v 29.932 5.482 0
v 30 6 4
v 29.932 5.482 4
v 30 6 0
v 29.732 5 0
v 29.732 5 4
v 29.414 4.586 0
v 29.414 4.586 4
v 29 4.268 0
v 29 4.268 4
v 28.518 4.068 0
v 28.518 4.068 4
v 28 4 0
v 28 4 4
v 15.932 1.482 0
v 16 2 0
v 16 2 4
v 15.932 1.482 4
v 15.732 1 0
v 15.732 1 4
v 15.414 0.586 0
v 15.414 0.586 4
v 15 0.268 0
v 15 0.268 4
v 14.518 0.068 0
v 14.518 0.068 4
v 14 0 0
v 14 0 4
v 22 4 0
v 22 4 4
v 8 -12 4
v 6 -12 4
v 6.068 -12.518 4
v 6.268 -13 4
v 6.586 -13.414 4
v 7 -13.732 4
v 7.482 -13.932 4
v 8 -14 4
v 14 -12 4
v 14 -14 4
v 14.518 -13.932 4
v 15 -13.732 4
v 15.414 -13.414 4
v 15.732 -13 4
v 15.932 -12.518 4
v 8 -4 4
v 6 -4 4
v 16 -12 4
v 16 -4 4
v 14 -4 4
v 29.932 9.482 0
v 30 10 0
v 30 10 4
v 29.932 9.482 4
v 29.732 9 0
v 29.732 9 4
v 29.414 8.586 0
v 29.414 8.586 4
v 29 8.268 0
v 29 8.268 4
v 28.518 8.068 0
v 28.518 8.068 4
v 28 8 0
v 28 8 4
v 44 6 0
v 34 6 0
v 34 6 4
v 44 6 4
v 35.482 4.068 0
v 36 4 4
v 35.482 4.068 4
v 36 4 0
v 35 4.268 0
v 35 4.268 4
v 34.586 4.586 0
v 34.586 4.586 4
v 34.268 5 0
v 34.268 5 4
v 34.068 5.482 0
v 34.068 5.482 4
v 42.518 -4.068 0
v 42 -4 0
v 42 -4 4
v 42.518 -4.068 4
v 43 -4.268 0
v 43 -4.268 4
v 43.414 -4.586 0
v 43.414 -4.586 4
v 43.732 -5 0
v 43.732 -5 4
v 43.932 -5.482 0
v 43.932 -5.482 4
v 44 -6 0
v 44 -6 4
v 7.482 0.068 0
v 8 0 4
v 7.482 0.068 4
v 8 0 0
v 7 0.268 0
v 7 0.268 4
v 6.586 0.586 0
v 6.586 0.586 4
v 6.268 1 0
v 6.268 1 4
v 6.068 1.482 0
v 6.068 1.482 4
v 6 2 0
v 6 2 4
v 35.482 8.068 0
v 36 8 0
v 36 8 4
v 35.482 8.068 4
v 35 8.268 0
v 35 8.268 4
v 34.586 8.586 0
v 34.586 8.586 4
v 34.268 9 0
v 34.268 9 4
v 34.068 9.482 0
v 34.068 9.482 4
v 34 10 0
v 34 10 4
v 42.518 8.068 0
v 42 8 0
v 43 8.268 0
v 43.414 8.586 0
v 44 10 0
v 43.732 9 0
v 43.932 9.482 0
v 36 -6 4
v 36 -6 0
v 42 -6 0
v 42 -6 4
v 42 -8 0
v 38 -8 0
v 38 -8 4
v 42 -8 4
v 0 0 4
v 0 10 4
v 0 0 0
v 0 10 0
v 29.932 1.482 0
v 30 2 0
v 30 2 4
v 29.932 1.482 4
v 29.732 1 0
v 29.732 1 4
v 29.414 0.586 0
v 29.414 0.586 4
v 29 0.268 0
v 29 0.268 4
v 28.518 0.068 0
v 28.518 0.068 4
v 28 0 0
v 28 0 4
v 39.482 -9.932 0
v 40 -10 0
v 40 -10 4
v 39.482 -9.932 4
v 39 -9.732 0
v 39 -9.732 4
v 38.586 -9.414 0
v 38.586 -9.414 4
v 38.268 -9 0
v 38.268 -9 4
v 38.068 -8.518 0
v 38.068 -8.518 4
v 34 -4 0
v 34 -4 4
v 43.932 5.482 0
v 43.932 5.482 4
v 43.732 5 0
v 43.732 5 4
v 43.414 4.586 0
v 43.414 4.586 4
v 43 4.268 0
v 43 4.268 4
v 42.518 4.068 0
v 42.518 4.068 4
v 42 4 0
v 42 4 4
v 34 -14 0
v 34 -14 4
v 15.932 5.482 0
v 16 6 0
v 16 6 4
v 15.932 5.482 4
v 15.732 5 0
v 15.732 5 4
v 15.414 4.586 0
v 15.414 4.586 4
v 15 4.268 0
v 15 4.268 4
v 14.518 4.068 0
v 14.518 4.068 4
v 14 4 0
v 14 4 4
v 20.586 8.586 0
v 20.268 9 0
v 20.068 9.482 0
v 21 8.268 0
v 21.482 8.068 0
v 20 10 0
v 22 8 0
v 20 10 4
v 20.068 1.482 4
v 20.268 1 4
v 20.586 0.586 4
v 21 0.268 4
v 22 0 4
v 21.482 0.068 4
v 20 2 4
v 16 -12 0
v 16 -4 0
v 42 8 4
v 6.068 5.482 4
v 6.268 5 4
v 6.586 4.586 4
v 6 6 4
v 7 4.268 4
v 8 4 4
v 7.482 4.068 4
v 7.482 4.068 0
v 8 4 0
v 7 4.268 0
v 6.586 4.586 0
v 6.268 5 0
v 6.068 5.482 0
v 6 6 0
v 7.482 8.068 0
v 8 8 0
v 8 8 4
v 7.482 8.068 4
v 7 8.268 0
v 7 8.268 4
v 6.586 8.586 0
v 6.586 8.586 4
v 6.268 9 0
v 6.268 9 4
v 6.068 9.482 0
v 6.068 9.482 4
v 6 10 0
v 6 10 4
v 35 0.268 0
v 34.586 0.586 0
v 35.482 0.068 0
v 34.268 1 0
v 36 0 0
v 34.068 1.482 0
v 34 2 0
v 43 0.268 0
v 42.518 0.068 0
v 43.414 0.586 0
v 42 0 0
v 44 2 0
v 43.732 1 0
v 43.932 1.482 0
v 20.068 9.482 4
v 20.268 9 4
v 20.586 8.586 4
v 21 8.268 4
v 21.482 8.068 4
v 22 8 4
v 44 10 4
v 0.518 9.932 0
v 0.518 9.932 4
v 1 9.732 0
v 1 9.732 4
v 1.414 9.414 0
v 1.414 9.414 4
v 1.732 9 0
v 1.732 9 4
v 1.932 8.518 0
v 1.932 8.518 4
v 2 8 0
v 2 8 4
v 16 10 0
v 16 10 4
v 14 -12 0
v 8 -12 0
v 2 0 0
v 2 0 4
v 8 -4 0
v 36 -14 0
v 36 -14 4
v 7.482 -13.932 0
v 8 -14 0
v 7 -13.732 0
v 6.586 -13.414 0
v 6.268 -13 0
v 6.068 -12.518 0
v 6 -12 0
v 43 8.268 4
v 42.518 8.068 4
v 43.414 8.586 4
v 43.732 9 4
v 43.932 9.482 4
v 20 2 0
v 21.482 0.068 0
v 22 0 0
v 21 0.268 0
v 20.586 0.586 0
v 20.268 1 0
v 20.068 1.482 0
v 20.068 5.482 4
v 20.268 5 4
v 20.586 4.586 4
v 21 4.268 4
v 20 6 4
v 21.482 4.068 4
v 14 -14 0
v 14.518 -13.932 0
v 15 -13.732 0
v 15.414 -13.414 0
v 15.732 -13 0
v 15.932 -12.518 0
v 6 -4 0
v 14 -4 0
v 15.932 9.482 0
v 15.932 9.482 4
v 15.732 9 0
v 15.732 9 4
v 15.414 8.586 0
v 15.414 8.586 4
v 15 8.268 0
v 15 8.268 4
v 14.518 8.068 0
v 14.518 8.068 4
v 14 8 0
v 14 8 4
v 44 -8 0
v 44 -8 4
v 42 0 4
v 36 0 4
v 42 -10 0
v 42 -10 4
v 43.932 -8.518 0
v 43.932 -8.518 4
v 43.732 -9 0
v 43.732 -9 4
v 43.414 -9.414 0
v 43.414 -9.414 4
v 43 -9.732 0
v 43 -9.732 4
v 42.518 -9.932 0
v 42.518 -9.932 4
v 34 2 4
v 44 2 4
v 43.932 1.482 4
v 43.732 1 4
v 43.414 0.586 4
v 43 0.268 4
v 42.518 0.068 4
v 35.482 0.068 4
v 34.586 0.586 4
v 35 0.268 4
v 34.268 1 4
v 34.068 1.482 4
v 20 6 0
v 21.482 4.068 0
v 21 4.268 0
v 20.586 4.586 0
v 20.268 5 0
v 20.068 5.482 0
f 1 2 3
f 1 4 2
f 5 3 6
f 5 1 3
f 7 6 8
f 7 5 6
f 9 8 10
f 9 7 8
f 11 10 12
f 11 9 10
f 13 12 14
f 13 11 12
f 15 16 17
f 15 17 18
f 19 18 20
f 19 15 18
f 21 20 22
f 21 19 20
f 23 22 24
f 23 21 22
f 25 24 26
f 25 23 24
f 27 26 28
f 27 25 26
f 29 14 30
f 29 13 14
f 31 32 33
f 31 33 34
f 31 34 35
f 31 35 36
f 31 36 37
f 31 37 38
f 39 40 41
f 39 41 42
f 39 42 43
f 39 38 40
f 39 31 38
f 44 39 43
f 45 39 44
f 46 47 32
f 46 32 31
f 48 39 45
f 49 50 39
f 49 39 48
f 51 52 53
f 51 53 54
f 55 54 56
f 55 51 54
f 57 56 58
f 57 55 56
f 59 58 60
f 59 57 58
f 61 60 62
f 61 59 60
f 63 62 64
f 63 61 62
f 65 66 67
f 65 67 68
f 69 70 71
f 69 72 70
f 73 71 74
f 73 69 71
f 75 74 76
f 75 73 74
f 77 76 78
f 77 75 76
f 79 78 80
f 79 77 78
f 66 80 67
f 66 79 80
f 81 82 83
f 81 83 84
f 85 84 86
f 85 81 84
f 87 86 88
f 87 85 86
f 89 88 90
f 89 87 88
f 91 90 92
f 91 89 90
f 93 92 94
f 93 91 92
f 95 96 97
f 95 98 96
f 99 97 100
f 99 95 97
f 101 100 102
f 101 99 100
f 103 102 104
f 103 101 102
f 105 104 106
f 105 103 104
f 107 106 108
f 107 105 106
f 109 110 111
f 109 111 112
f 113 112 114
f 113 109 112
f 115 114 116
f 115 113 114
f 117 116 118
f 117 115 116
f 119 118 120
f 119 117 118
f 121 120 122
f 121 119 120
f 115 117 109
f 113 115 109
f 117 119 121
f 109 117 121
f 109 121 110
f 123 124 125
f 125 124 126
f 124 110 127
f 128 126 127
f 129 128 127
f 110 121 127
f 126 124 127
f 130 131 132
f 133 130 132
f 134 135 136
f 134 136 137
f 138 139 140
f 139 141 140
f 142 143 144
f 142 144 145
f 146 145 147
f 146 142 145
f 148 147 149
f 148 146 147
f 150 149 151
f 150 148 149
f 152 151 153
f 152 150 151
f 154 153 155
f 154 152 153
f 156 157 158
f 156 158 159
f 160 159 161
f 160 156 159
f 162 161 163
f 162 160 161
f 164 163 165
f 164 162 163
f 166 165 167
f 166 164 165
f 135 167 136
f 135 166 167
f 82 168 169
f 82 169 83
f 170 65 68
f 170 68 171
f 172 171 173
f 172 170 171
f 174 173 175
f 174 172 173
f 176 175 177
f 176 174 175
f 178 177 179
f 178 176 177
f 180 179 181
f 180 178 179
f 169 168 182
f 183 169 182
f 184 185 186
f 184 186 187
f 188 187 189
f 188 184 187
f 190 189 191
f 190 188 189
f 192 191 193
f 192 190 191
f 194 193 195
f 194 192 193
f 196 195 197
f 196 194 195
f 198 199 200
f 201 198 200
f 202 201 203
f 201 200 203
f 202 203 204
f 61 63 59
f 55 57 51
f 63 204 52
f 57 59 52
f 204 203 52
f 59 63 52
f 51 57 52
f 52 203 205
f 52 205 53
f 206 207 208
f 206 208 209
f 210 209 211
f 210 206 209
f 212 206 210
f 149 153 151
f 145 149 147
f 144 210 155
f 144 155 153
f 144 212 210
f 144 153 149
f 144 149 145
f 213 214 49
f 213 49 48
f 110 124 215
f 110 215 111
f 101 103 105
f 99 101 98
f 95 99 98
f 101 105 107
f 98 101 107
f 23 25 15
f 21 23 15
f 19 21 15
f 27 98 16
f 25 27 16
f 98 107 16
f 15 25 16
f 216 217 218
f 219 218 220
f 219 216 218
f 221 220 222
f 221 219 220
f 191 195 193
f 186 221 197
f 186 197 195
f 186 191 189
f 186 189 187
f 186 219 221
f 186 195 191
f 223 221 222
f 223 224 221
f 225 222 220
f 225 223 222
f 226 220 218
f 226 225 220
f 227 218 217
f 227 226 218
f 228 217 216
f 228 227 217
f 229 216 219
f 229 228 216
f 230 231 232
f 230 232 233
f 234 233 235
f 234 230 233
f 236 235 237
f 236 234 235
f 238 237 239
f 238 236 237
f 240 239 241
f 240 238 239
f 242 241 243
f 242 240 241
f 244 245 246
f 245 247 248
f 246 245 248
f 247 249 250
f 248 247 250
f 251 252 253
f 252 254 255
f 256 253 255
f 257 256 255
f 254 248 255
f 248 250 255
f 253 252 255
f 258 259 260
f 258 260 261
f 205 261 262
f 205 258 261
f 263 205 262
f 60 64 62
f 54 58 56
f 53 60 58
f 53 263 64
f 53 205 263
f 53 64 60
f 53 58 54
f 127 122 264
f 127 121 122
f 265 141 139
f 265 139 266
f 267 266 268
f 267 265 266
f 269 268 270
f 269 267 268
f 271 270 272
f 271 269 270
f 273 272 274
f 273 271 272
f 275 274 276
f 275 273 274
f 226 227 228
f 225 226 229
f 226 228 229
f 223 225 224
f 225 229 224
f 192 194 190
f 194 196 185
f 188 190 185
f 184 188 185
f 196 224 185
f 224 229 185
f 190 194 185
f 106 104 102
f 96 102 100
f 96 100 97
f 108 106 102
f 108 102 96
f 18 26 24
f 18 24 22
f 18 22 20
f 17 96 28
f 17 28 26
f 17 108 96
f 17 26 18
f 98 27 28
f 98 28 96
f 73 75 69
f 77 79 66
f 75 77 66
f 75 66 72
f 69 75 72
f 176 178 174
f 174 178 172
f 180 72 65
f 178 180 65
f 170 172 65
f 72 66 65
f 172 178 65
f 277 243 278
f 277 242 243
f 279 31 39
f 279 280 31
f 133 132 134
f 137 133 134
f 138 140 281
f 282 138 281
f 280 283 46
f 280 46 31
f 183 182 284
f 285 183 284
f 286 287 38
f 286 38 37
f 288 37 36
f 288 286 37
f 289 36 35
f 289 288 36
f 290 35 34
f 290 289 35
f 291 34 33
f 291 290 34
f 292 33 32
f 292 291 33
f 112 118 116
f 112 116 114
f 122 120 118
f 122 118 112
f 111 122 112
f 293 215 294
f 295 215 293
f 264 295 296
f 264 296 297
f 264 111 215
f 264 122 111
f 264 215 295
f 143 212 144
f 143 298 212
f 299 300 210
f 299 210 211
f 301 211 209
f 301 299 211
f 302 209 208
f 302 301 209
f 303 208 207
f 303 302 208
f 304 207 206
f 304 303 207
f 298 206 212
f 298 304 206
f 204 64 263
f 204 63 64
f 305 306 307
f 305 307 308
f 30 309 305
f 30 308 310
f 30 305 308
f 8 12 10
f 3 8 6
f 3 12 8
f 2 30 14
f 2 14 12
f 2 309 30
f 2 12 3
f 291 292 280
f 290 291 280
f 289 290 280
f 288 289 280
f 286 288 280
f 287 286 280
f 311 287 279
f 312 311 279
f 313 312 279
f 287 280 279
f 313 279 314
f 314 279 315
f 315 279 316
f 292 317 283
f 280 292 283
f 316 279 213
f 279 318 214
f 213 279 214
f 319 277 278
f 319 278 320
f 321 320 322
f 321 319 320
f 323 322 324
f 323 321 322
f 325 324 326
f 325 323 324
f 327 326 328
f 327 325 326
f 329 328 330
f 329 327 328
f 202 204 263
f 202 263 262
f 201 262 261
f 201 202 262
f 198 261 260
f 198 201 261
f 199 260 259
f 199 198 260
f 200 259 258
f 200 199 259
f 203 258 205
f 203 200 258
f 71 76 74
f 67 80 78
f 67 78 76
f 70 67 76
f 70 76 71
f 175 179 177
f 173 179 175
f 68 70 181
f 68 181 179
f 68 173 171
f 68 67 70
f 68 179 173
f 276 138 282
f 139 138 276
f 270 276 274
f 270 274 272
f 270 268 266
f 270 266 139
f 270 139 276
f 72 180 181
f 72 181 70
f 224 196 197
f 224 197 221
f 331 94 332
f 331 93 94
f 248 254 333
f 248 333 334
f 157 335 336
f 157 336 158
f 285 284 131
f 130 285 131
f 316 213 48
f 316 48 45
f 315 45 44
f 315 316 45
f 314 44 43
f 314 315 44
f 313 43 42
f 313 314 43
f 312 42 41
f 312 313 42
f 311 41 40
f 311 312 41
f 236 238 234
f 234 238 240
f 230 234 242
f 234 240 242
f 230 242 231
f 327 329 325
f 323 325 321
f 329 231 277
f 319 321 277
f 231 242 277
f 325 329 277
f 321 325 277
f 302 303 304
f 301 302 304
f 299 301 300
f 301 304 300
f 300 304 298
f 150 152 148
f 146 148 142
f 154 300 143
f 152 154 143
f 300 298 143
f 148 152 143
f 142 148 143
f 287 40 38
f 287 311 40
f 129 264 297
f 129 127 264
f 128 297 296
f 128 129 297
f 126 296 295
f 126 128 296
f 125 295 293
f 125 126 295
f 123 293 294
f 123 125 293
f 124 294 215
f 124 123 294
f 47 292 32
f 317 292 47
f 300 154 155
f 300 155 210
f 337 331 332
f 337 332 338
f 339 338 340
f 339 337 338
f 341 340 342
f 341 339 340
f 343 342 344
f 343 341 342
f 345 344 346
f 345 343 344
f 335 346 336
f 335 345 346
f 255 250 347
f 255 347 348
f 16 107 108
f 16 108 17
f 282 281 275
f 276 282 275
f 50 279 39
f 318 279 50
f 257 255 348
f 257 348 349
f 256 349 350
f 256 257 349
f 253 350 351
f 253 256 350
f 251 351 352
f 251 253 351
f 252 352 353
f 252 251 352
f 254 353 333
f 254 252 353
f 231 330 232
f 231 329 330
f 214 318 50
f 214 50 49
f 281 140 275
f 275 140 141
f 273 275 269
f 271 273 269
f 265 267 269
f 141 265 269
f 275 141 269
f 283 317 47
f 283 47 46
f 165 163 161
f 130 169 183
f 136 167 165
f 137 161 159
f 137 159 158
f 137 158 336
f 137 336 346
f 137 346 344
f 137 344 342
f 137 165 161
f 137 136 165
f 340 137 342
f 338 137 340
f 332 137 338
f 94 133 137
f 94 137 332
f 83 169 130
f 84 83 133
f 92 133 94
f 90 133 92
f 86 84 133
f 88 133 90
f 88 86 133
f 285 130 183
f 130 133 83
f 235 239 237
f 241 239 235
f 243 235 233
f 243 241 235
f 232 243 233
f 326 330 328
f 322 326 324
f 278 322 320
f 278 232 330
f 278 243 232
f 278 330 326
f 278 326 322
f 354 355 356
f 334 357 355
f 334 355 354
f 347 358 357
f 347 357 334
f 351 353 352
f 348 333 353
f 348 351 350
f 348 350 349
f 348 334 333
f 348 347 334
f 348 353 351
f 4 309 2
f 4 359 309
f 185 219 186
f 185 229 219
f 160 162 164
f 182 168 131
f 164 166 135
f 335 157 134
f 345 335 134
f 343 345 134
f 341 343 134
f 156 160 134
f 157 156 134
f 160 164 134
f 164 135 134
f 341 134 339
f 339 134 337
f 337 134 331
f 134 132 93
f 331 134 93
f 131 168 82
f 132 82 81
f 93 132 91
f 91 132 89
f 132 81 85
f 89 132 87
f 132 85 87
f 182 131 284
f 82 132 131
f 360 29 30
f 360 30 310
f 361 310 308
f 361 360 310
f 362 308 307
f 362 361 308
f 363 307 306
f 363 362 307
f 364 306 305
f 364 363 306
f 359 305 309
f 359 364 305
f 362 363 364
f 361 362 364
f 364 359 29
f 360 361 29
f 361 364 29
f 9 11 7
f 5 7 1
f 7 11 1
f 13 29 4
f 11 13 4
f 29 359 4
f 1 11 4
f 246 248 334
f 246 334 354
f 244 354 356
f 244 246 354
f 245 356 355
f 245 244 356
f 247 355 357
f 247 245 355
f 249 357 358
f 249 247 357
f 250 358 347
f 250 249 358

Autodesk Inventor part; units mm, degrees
ref_plane "YZ Plane" through (0, 0, 0) normal (1, 0, 0) x (0, 1, 0)
ref_plane "XZ Plane" through (0, 0, 0) normal (0, 1, 0) x (-1, 0, 0)
ref_plane "XY Plane" through (0, 0, 0) normal (0, 0, 1) x (1, 0, 0)
sketch "Sketch5" plane through (0, 0, 0) normal (0, 0, 1) x (1, 0, 0)
  line L0 (0, 0) -> (2, 0)
  line L1 (2, 0) -> (2, 8)
  line L2 (0, 10) -> (0, 10)
  line L3 (0, 10) -> (0, 0)
  line L4 (6, 10) -> (16, 10)
  line L5 (16, 10) -> (16, 10)
  line L6 (14, 8) -> (8, 8)
  line L7 (6, 10) -> (6, 10)
  line L8 (6, 6) -> (16, 6)
  line L9 (16, 6) -> (16, 6)
  line L10 (14, 4) -> (8, 4)
  line L11 (6, 6) -> (6, 6)
  line L12 (6, 2) -> (16, 2)
  line L13 (16, 2) -> (16, 2)
  line L14 (14, 0) -> (8, 0)
  line L15 (6, 2) -> (6, 2)
  line L16 (20, 10) -> (30, 10)
  line L17 (30, 10) -> (30, 10)
  line L18 (28, 8) -> (22, 8)
  line L19 (20, 10) -> (20, 10)
  line L20 (20, 6) -> (30, 6)
  line L21 (30, 6) -> (30, 6)
  line L22 (28, 4) -> (22, 4)
  line L23 (20, 6) -> (20, 6)
  line L24 (20, 2) -> (30, 2)
  line L25 (30, 2) -> (30, 2)
  line L26 (28, 0) -> (22, 0)
  line L27 (20, 2) -> (20, 2)
  line L28 (34, 10) -> (44, 10)
  line L29 (44, 10) -> (44, 10)
  line L30 (42, 8) -> (36, 8)
  line L31 (34, 10) -> (34, 10)
  line L32 (34, 6) -> (44, 6)
  line L33 (44, 6) -> (44, 6)
  line L34 (42, 4) -> (36, 4)
  line L35 (34, 6) -> (34, 6)
  line L36 (34, 2) -> (44, 2)
  line L37 (44, 2) -> (44, 2)
  line L38 (42, 0) -> (36, 0)
  line L39 (34, 2) -> (34, 2)
  arc A0 (2, 8) -> (0, 10) centre (0, 8) ccw
  arc A1 (6, 10) -> (8, 8) centre (8, 10) ccw
  arc A2 (6, 6) -> (8, 4) centre (8, 6) ccw
  arc A3 (6, 2) -> (8, 0) centre (8, 2) ccw
  arc A4 (14, 0) -> (16, 2) centre (14, 2) ccw
  arc A5 (14, 4) -> (16, 6) centre (14, 6) ccw
  arc A6 (14, 8) -> (16, 10) centre (14, 10) ccw
  arc A7 (20, 10) -> (22, 8) centre (22, 10) ccw
  arc A8 (20, 6) -> (22, 4) centre (22, 6) ccw
  arc A9 (20, 2) -> (22, 0) centre (22, 2) ccw
  arc A10 (28, 0) -> (30, 2) centre (28, 2) ccw
  arc A11 (28, 4) -> (30, 6) centre (28, 6) ccw
  arc A12 (28, 8) -> (30, 10) centre (28, 10) ccw
  arc A13 (34, 10) -> (36, 8) centre (36, 10) ccw
  arc A14 (34, 6) -> (36, 4) centre (36, 6) ccw
  arc A15 (34, 2) -> (36, 0) centre (36, 2) ccw
  arc A16 (42, 0) -> (44, 2) centre (42, 2) ccw
  arc A17 (42, 4) -> (44, 6) centre (42, 6) ccw
  arc A18 (42, 8) -> (44, 10) centre (42, 10) ccw
  line L40 (6, -4) -> (8, -4)
  line L41 (8, -4) -> (8, -12)
  line L42 (8, -12) -> (14, -12)
  line L43 (14, -12) -> (14, -4)
  line L44 (14, -4) -> (16, -4)
  line L45 (16, -4) -> (16, -12)
  line L46 (14, -14) -> (8, -14)
  line L47 (6, -12) -> (6, -4)
  arc A19 (6, -12) -> (8, -14) centre (8, -12) ccw
  arc A20 (14, -14) -> (16, -12) centre (14, -12) ccw
  line L48 (6, 0) -> (6, 10) construction
  line L49 (20, -14) -> (20, -4)
  line L50 (20, -4) -> (28, -4)
  line L51 (30, -6) -> (30, -8)
  line L52 (20, -14) -> (22, -14)
  line L53 (22, -14) -> (22, -6)
  line L54 (22, -6) -> (28, -6)
  arc A21 (30, -6) -> (28, -4) centre (28, -6) ccw
  line L55 (30, -12) -> (30, -14)
  line L56 (30, -14) -> (28, -14)
  line L57 (20, 10) -> (20, 0) construction
  line L58 (34, -4) -> (34, -14)
  line L59 (34, -4) -> (42, -4)
  line L60 (34, -14) -> (36, -14)
  line L61 (36, -14) -> (36, -6)
  line L62 (36, -6) -> (42, -6)
  line L63 (42, -6) -> (42, -8)
  line L64 (38, -8) -> (42, -8)
  line L65 (38, -8) -> (38, -8)
  line L66 (44, -6) -> (44, -8)
  line L67 (42, -10) -> (40, -10)
  line L68 (34, 10) -> (34, 0) construction
  arc A22 (38, -8) -> (40, -10) centre (40, -8) ccw
  arc A23 (42, -10) -> (44, -8) centre (42, -8) ccw
  arc A24 (44, -6) -> (42, -4) centre (42, -6) ccw
  line L69 (28, -6) -> (28, -8)
  line L70 (30, -8) -> (30, -8)
  line L71 (30, -12) -> (30, -12)
  line L72 (28, -10) -> (28, -10)
  arc A25 (30, -12) -> (28, -10) centre (28, -12) ccw
  line L73 (28, -10) -> (28, -10)
  arc A26 (28, -10) -> (30, -8) centre (28, -8) ccw
  line L74 (28, -8) -> (26, -8)
  line L75 (28, -12) -> (26, -12)
  line L76 (28, -12) -> (28, -14)
  line L77 (24, -10) -> (24, -10)
  arc A27 (26, -8) -> (24, -10) centre (26, -10) ccw
  line L78 (24, -10) -> (24, -10)
  arc A28 (24, -10) -> (26, -12) centre (26, -10) ccw
  point P0 (2, 10)
  point P1 (16, 8)
  point P2 (6, 8)
  point P3 (16, 4)
  point P4 (6, 4)
  point P5 (16, 0)
  point P6 (30, 8)
  point P7 (20, 8)
  point P8 (30, 4)
  point P9 (20, 4)
  point P10 (30, 0)
  point P11 (44, 8)
  point P12 (34, 8)
  point P13 (44, 4)
  point P14 (34, 4)
  point P15 (44, 0)
  point P16 (30, -4)
  point P17 (30, -10)
  point P18 (44, -4)
  point P19 (38, -10)
  point P20 (24, -8)
  dimension "d59" = 2
  dimension "d60" = 10
  dimension "d61" = 10
  dimension "d62" = 2
  dimension "d63" = 10
  dimension "d64" = 2
  dimension "d65" = 10
  dimension "d66" = 2
  dimension "d67" = 4
  dimension "d68" = 2
  dimension "d69" = 10
  dimension "d70" = 2
  dimension "d71" = 4
  dimension "d72" = 10
  dimension "d73" = 2
  dimension "d74" = 10
  dimension "d75" = 2
  dimension "d76" = 10
  dimension "d77" = 2
  dimension "d78" = 4
  dimension "d79" = 10
  dimension "d80" = 2
  dimension "d81" = 10
  dimension "d82" = 2
  dimension "d83" = 2
  dimension "d84" = 4
  dimension "d85" = 2
  dimension "d86" = 2
  dimension "d87" = 2
  dimension "d88" = 2
  dimension "d89" = 10
  dimension "d90" = 10
  dimension "d91" = 6
  dimension "d93" = 2
  dimension "d96" = 10
  dimension "d97" = 2
  dimension "d98" = 2
  dimension "d101" = 2
  dimension "d102" = 2
  dimension "d103" = 2
  dimension "d104" = 2
  dimension "d105" = 2
  dimension "d106" = 10
  dimension "d107" = 6
  dimension "d108" = 2
  dimension "d112" = 2
  dimension "d113" = 2
  dimension "d114" = 4
  dimension "d115" = 2
  dimension "d116" = 2
  dimension "d117" = 4
  dimension "d118" = 2
  dimension "d119" = 2
extrude "Extrusion3" add sketch "Sketch5" along normal blind 4 contours L3 A0 L1 L0 | L4 A6 L6 A1 | L8 A5 L10 A2 | L12 A4 L14 A3 | L16 A12 L18 A7 | L20 A11 L22 A8 | L24 A10 L26 A9 | L28 A18 L30 A13 | L32 A17 L34 A14 | L36 A16 L38 A15 | L40 L41 L42 L43 L44 L45 A20 L46 A19 L47 | L59 A24 L66 A23 L67 A22 L64 L63 L62 L61 L60 L58
equation "\"d67\" = 2 * d59"
equation "\"d68\" = d59"
equation "\"d71\" = d67"
equation "\"d78\" = d67"
equation "\"d84\" = d67"
equation "\"d85\" = d59"
equation "\"d86\" = d59"
equation "\"d87\" = d59"
equation "\"d89\" = d60"
equation "\"d90\" = d89"
properties part number "ieee"
